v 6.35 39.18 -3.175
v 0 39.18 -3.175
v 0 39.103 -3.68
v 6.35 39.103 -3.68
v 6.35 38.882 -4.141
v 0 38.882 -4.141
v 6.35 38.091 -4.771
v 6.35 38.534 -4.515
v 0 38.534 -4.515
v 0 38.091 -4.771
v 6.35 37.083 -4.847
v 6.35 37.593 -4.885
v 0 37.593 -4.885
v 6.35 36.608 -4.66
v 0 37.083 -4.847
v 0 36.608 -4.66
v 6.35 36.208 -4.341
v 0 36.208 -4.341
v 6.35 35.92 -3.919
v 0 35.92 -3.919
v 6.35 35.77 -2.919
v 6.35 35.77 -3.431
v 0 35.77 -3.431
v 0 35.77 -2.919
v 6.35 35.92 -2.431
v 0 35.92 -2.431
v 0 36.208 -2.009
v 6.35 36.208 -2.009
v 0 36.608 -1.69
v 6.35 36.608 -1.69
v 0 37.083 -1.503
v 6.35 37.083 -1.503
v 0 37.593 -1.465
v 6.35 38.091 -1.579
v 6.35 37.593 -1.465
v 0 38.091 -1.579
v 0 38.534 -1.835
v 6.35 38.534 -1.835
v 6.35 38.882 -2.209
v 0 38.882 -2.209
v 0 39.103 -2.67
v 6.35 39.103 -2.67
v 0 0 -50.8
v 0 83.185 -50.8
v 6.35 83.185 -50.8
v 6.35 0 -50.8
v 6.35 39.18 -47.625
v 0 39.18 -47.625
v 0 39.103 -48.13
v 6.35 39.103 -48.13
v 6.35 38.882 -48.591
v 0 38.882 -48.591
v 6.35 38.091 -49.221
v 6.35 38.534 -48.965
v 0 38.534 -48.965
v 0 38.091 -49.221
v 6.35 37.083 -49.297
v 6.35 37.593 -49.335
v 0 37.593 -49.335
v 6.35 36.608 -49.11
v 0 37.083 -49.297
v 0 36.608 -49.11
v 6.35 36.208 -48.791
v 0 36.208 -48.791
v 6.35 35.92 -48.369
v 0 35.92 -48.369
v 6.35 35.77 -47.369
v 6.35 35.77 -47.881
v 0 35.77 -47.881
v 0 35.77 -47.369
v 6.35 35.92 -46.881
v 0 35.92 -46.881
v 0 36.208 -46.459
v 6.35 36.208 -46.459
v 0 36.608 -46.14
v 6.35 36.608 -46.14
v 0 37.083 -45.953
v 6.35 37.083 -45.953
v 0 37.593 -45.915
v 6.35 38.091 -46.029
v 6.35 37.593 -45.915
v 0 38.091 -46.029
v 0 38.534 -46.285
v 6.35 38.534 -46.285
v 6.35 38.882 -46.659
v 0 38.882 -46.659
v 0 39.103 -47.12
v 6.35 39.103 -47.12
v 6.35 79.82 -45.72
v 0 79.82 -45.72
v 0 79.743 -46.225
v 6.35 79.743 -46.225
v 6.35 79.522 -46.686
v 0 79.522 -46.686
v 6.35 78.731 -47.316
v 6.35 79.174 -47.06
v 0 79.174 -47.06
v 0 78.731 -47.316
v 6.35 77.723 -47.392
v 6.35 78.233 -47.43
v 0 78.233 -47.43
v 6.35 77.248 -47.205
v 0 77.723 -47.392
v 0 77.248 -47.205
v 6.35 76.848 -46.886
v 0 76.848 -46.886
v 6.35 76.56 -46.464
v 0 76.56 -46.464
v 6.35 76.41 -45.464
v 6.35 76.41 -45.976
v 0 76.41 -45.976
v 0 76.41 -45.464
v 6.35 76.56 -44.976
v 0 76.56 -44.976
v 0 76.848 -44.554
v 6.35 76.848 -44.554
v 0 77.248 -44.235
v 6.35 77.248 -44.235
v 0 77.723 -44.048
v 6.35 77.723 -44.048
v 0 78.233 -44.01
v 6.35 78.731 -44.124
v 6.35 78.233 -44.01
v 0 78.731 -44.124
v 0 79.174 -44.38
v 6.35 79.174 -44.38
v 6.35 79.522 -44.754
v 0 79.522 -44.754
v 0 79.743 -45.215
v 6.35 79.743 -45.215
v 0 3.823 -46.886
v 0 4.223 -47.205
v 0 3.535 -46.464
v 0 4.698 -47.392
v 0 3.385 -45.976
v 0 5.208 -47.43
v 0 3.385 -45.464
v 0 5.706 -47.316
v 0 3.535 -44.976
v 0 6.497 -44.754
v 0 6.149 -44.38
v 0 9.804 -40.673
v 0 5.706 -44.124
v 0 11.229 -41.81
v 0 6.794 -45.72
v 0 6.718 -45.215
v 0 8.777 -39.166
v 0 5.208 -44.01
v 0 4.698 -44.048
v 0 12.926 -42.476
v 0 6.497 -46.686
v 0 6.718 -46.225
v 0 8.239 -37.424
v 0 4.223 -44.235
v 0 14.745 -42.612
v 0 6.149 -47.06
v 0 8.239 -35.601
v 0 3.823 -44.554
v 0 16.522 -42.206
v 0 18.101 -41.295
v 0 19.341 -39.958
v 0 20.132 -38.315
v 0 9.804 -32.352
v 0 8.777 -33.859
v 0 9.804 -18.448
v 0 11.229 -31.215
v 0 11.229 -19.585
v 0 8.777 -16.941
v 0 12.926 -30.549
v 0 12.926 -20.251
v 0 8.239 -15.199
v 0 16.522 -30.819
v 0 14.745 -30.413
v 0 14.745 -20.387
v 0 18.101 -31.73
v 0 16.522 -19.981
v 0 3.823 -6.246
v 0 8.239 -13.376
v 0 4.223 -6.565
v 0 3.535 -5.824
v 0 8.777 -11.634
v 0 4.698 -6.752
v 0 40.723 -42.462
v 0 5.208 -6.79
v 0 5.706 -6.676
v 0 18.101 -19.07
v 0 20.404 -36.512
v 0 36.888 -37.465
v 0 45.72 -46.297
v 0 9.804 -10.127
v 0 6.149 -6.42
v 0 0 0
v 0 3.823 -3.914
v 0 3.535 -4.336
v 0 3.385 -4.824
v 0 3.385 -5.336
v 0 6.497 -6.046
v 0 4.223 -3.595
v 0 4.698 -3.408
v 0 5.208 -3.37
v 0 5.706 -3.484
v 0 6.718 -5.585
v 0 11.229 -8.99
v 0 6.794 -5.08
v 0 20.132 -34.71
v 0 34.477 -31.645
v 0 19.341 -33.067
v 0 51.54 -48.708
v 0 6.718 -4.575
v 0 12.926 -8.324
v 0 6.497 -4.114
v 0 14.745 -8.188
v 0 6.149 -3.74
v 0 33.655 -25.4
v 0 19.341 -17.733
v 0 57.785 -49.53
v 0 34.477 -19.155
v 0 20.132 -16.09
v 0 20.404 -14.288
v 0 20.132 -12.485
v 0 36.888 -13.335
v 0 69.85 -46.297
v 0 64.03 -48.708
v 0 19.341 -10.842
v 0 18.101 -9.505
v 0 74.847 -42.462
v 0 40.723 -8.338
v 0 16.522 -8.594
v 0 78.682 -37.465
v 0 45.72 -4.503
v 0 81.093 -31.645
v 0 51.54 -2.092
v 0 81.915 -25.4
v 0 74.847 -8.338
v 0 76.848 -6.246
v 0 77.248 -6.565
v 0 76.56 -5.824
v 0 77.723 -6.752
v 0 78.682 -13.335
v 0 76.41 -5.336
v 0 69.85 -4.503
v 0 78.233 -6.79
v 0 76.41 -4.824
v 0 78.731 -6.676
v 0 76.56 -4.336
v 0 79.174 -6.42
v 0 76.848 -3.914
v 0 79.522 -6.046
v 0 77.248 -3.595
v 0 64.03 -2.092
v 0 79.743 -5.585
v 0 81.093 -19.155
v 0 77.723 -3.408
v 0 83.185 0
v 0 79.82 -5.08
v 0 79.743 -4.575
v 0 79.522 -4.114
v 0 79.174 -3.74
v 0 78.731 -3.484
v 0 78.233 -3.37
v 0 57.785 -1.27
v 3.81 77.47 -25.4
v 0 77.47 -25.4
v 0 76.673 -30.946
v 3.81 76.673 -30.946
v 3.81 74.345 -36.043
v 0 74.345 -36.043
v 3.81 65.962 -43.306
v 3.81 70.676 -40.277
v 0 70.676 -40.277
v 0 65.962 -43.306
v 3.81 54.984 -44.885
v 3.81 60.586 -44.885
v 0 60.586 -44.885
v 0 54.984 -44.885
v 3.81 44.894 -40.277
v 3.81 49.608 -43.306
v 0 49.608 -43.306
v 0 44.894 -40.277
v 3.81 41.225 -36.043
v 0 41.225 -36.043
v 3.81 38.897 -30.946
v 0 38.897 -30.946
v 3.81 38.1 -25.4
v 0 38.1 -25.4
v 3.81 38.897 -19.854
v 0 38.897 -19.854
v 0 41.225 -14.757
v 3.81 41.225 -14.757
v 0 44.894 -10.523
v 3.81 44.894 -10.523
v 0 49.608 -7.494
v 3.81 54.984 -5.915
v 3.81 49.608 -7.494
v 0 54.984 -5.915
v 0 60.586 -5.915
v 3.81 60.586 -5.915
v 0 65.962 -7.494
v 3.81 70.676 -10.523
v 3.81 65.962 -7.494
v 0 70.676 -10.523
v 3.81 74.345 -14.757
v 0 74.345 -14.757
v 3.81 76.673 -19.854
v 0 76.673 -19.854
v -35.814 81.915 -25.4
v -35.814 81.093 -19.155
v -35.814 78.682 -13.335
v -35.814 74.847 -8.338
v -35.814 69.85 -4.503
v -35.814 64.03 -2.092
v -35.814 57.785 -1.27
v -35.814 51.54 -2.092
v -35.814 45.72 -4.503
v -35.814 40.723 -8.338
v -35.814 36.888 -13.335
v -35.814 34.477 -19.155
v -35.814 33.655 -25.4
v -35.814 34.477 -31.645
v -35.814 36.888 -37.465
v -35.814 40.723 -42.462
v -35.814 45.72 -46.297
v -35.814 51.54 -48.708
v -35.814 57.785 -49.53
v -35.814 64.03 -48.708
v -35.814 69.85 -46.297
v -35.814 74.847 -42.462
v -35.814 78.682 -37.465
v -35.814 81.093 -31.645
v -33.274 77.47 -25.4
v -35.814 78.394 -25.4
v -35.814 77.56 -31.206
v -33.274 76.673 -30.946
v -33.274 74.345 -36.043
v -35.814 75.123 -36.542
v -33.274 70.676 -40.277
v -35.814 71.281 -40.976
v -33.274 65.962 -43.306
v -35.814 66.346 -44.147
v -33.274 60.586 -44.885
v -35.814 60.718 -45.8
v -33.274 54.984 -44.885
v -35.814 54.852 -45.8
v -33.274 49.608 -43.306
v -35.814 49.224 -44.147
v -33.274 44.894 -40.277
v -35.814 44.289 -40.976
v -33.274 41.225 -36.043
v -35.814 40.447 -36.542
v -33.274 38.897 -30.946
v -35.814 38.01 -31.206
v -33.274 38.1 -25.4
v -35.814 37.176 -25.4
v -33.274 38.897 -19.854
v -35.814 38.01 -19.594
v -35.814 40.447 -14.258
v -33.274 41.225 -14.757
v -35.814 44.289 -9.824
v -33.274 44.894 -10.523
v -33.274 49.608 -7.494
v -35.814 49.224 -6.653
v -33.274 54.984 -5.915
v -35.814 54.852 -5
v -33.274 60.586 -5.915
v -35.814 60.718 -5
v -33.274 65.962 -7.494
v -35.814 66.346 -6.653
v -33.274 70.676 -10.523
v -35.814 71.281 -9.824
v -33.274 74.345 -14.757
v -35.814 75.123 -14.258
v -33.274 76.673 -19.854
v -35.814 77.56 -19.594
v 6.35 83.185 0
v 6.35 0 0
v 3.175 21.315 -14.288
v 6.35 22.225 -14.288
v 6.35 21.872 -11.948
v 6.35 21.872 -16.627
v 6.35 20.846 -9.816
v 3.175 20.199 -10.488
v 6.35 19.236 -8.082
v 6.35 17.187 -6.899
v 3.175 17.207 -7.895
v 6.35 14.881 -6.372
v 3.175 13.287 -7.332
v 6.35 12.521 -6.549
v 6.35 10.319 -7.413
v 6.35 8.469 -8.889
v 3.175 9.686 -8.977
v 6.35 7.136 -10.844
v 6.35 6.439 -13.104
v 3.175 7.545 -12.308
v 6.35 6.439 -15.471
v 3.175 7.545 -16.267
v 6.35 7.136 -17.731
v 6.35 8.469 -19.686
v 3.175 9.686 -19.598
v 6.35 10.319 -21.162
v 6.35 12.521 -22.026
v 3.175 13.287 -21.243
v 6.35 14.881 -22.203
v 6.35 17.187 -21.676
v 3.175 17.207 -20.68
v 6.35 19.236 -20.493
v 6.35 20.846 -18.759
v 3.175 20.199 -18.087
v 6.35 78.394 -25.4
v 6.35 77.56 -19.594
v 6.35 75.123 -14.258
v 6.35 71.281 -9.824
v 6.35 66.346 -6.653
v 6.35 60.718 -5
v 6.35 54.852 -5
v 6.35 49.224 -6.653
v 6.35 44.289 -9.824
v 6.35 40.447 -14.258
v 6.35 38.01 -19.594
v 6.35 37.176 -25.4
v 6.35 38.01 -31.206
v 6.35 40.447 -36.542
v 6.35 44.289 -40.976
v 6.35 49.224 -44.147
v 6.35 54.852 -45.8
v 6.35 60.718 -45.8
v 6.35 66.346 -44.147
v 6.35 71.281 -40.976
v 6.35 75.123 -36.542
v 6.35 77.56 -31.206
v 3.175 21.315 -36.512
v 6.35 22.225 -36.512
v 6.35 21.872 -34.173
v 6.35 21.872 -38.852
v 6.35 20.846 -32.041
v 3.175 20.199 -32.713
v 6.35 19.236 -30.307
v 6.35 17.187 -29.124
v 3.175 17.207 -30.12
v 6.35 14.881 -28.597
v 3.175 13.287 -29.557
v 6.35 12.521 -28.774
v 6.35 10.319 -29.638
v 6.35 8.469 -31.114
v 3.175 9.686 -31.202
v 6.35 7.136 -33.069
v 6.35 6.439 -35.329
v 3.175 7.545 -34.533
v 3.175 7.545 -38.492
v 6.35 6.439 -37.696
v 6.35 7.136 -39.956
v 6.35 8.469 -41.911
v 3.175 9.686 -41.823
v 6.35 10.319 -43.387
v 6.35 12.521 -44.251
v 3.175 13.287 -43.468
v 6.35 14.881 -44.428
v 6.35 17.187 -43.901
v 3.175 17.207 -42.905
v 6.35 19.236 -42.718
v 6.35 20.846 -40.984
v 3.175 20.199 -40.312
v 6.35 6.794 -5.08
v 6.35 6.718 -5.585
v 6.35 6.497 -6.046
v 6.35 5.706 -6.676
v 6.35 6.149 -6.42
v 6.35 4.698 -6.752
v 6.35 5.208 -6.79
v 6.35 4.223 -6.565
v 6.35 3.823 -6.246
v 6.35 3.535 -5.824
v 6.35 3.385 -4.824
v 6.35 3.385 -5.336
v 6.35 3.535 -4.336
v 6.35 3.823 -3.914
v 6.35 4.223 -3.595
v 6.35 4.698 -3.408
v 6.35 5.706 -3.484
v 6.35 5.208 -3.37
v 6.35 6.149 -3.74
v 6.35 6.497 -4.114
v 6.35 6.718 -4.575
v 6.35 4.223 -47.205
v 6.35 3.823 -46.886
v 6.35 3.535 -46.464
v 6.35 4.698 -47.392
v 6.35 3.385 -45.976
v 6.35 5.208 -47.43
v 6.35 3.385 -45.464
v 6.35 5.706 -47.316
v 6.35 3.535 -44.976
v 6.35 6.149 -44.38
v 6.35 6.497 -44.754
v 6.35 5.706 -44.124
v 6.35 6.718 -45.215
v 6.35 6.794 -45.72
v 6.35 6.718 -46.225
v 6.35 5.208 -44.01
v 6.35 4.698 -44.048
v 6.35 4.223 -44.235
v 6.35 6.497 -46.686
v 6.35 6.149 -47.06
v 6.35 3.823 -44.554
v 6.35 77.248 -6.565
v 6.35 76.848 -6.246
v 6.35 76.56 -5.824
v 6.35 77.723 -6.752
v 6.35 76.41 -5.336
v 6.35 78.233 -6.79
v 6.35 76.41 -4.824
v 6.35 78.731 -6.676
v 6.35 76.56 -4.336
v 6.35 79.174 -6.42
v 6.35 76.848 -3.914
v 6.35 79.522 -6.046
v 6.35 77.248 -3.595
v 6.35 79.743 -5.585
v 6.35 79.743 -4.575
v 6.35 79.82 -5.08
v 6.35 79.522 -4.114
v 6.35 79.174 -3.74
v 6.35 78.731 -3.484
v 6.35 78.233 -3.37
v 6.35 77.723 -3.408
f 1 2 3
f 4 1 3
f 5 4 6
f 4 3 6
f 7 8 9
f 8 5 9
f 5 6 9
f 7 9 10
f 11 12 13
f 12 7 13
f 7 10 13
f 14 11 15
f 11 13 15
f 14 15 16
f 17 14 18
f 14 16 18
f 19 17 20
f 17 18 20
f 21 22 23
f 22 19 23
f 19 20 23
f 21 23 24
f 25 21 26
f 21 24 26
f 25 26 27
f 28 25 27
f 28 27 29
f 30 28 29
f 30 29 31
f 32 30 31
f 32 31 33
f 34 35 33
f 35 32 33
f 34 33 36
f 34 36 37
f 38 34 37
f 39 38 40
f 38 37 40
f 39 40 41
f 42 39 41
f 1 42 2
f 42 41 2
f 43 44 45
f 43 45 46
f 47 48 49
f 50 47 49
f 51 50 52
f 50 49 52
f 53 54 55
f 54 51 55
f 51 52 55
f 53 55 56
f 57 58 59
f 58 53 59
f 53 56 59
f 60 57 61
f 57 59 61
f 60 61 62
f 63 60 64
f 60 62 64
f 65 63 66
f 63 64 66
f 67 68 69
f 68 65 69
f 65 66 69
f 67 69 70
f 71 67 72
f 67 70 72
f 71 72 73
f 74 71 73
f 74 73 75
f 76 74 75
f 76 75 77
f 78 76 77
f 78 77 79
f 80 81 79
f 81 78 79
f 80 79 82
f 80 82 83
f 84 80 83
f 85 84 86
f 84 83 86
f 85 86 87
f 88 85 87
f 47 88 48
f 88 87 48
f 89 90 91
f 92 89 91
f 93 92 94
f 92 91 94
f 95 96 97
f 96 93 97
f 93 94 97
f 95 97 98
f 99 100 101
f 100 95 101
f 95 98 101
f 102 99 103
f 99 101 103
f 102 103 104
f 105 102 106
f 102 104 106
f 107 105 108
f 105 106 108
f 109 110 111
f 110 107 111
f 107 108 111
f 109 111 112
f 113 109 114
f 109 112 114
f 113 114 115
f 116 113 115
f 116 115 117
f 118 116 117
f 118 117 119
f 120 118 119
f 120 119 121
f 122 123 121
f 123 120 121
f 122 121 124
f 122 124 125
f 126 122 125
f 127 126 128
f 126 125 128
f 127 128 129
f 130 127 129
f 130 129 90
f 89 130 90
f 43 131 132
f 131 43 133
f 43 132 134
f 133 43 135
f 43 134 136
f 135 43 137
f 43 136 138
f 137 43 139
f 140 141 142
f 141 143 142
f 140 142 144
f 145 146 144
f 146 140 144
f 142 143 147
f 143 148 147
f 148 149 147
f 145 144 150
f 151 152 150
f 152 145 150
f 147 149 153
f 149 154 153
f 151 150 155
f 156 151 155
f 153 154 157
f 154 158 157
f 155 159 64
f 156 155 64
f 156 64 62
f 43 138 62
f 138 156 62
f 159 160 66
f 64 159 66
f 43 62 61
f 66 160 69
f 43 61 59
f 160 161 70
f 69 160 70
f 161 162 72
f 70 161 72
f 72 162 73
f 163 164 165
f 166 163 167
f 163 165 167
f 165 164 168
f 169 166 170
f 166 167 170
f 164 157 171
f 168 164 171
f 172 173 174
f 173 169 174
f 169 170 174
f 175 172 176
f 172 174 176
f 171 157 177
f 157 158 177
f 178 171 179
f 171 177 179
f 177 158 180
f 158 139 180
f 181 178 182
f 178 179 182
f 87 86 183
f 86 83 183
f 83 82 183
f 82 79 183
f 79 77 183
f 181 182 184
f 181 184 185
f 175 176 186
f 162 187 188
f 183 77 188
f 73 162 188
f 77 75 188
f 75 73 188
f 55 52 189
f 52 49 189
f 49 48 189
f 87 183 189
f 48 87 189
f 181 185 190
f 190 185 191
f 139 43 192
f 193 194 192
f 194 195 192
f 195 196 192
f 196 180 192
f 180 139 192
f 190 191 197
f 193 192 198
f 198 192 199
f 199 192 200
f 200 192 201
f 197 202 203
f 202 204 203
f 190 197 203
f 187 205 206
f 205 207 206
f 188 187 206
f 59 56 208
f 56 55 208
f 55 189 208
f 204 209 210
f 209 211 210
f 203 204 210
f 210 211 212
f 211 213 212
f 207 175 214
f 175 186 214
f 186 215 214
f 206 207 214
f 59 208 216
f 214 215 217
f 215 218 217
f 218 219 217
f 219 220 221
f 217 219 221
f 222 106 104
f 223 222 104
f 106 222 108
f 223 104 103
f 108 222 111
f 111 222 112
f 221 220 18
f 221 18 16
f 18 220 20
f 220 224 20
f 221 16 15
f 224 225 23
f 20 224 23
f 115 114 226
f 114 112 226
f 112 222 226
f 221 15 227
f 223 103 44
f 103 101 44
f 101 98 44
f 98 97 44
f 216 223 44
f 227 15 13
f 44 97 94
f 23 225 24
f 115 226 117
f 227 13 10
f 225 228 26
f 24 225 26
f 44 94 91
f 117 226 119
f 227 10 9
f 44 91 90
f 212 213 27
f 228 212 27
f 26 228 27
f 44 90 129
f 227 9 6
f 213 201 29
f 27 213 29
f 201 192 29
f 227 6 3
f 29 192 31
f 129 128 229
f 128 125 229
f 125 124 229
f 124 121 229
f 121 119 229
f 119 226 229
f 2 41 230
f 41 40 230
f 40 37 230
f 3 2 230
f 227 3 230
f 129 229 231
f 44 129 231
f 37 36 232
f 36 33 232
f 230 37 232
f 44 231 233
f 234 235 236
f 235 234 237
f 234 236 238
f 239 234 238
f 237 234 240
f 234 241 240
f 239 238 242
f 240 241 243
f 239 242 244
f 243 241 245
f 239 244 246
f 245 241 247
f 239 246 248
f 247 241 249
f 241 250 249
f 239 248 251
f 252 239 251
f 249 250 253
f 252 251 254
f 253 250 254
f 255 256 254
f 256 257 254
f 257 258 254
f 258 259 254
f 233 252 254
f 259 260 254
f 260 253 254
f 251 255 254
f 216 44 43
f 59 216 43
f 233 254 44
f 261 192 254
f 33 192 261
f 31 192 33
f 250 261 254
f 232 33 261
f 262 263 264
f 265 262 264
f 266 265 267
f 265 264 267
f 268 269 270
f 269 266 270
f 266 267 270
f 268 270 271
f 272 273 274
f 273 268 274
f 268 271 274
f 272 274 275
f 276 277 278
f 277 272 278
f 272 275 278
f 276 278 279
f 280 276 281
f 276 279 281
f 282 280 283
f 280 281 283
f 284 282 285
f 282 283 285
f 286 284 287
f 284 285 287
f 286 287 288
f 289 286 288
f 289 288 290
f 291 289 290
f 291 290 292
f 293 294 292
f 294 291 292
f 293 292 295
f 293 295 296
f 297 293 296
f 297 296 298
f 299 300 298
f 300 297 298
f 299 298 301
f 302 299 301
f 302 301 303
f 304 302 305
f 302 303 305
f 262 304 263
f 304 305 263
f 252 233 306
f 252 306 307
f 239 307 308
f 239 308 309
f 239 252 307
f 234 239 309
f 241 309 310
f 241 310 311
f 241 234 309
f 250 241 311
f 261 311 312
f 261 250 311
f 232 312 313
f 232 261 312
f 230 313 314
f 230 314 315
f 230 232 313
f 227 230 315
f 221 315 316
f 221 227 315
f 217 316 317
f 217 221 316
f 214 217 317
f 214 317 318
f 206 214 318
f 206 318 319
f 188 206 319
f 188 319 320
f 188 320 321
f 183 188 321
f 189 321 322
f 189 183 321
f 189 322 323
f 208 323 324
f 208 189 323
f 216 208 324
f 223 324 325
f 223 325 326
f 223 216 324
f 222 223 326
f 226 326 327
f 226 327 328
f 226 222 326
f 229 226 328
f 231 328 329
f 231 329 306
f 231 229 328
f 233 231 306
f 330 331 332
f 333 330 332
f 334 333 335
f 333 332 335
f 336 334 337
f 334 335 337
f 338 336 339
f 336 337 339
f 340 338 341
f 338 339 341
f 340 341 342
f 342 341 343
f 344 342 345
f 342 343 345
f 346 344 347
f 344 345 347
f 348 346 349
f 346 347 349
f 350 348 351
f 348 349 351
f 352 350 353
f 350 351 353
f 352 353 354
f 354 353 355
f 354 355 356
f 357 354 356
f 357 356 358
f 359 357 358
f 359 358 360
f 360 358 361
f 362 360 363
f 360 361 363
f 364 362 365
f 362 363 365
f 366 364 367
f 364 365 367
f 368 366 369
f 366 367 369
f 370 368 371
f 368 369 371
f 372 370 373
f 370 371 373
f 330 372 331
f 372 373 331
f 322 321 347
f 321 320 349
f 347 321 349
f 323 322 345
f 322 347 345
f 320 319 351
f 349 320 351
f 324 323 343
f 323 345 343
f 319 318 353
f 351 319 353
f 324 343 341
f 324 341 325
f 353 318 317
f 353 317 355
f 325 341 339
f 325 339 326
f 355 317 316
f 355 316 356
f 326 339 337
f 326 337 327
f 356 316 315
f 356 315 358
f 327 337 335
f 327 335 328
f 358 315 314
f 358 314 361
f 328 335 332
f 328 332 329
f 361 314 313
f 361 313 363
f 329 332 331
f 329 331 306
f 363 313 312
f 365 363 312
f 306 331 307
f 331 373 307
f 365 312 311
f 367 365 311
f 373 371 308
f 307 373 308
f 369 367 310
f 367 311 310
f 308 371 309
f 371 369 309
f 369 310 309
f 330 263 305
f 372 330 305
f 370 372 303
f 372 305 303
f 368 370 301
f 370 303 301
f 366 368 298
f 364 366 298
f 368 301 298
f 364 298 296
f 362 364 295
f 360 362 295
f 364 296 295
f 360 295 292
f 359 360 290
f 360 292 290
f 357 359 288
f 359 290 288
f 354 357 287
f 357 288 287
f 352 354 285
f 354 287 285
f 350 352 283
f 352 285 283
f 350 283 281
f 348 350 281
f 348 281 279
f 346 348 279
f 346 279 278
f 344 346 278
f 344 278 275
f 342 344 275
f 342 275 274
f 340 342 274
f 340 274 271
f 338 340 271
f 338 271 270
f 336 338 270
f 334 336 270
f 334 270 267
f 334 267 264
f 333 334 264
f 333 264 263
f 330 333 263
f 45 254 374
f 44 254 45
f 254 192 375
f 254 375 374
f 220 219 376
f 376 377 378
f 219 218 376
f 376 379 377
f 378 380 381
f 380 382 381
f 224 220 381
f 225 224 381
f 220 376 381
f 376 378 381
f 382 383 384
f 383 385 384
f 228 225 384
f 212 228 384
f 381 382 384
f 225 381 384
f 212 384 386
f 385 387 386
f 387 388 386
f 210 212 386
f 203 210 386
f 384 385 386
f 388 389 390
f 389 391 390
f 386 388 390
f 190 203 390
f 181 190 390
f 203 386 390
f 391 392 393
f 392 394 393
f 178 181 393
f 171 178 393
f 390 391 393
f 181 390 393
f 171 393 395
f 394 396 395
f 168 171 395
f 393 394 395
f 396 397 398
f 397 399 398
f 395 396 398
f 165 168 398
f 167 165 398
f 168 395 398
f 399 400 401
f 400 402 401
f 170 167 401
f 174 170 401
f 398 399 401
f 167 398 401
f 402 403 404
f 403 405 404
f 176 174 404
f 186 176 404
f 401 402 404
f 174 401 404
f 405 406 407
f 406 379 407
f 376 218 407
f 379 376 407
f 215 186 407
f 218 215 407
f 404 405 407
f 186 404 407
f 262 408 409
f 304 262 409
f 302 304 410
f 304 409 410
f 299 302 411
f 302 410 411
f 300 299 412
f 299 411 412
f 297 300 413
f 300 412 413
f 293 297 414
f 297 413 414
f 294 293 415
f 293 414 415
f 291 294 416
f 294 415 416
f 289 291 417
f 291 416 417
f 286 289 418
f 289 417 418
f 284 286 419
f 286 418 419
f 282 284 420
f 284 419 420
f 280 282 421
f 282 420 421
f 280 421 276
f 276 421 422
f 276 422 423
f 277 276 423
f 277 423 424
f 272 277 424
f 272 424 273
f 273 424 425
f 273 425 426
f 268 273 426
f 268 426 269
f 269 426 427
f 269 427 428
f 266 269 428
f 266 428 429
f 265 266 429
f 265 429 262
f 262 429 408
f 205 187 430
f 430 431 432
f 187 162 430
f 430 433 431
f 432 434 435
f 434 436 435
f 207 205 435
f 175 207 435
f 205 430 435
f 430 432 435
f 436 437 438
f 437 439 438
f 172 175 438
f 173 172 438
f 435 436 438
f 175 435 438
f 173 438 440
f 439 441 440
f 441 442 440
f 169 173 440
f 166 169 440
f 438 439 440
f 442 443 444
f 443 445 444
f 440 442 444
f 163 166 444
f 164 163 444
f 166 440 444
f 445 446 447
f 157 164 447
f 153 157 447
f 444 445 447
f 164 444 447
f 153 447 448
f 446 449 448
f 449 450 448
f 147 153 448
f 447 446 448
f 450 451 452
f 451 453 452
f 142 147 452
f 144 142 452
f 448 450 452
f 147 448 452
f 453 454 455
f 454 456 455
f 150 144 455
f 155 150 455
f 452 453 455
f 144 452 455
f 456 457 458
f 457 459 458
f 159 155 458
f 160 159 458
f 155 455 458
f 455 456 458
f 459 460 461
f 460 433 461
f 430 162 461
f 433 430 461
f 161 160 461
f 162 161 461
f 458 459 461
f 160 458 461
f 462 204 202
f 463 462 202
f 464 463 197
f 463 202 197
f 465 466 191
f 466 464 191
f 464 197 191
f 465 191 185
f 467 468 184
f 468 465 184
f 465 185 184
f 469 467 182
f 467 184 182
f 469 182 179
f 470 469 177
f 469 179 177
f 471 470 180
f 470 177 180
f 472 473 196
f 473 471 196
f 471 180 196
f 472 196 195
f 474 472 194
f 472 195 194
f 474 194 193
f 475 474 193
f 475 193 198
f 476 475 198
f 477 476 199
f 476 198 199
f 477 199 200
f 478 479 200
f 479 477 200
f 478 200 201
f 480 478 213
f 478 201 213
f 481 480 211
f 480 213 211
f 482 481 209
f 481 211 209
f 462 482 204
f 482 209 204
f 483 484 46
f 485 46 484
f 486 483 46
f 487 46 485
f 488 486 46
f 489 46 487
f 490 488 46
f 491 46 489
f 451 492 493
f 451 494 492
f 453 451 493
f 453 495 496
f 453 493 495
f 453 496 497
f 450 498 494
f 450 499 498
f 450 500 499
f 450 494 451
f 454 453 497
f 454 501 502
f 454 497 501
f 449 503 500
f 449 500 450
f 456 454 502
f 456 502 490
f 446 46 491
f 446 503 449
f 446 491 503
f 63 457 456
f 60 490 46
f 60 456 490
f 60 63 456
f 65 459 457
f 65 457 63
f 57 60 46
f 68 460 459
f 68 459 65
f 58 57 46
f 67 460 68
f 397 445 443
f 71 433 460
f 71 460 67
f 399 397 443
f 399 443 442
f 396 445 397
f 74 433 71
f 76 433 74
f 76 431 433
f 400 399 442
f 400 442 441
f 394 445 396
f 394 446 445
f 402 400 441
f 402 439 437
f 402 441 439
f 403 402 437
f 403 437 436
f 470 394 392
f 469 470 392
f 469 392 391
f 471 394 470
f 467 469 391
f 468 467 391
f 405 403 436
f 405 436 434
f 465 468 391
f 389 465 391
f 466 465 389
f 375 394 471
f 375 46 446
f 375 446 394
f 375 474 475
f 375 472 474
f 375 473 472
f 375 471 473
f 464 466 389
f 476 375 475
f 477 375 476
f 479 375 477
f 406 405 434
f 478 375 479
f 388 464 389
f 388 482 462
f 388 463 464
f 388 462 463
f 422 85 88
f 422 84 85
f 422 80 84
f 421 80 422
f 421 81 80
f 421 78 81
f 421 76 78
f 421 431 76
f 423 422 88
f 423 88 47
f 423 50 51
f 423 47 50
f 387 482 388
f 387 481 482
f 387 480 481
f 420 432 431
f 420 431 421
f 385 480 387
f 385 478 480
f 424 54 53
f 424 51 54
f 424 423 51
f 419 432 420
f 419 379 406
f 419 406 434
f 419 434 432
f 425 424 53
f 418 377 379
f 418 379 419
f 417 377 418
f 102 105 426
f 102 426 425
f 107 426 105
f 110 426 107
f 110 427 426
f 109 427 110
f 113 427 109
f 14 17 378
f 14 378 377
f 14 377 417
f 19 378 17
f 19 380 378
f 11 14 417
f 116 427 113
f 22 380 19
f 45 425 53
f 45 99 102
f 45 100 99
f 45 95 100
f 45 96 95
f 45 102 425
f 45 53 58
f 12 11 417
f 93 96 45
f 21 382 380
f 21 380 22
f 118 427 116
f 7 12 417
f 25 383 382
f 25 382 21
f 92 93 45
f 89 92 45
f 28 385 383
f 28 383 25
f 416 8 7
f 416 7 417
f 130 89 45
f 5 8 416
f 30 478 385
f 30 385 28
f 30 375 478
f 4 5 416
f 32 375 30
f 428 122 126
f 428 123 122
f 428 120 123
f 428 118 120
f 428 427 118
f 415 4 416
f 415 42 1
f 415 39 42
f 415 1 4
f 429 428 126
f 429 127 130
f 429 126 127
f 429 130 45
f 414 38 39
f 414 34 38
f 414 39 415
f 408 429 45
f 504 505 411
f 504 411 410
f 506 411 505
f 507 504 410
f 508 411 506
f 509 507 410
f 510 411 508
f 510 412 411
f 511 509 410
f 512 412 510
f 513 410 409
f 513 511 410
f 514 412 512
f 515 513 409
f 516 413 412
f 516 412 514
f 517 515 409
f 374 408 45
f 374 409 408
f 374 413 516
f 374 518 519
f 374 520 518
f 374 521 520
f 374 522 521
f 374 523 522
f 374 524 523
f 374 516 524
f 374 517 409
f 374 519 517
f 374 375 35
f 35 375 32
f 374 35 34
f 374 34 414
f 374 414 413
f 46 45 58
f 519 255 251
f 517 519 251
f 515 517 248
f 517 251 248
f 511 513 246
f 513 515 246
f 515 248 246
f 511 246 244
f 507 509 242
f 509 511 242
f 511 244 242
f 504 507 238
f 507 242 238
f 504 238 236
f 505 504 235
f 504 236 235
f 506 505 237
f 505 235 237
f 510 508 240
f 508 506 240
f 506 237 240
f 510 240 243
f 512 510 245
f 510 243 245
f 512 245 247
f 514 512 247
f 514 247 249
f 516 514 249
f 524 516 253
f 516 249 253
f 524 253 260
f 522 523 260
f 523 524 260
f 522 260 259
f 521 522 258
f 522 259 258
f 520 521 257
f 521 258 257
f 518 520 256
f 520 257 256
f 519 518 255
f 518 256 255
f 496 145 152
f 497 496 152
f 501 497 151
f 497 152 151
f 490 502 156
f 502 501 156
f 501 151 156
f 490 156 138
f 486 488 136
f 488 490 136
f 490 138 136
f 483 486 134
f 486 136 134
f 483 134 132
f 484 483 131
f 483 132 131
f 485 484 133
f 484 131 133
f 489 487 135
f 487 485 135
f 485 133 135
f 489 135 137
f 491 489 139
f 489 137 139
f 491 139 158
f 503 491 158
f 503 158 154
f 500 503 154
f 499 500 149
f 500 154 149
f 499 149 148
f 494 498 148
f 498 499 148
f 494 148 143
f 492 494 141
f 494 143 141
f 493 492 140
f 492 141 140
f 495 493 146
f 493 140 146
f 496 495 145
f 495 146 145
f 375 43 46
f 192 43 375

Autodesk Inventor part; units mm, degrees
ref_plane "YZ Plane" through (0, 0, 0) normal (1, 0, 0) x (0, 1, 0)
ref_plane "XZ Plane" through (0, 0, 0) normal (0, 1, 0) x (-1, 0, 0)
ref_plane "XY Plane" through (0, 0, 0) normal (0, 0, 1) x (1, 0, 0)
sketch "Sketch1" plane through (0, 0, 0) normal (1, 0, 0) x (0, 1, 0)
  line L0 (0, 0) -> (83.185, 0)
  line L1 (83.185, 0) -> (83.185, -50.8)
  line L2 (83.185, -50.8) -> (0, -50.8)
  line L3 (0, -50.8) -> (0, 0)
  circle A0 centre (57.785, -25.4) radius 19.685
  circle A1 centre (14.2875, -14.2875) radius 7.9375
  circle A2 centre (14.2875, -36.5125) radius 7.9375
  circle A3 centre (5.08, -5.08) radius 1.7145
  circle A4 centre (5.08, -45.72) radius 1.7145
  circle A5 centre (78.105, -5.08) radius 1.7145
  circle A6 centre (78.105, -45.72) radius 1.7145
  line L4 (83.185, 0) -> (32.385, 0)
  circle A7 centre (37.465, -47.625) radius 1.7145
  circle A8 centre (37.465, -3.175) radius 1.7145
  circle A9 centre (57.785, -25.4) radius 24.13
  dimension "d0" = 83.185
  dimension "d1" = 50.8
  dimension "d2" = 39.37
  dimension "d3" = 25.4
  dimension "d4" = 25.4
  dimension "d5" = 15.875
  dimension "d6" = 15.875
  dimension "d7" = 14.2875
  dimension "d8" = 14.2875
  dimension "d9" = 14.2875
  dimension "d10" = 14.2875
  dimension "d16" = 3.429
  dimension "d17" = 5.08
  dimension "d18" = 5.08
  dimension "d19" = 50.8
  dimension "d20" = 3.429
  dimension "d21" = 3.175
  dimension "d23" = 48.26
  dimension "d32" = 5.08
  dimension "d33" = 5.08
  dimension "d34" = 3.175
  dimension "d35" = 5.08
  dimension "d36" = 5.08
  dimension "d37" = 5.08
  dimension "d38" = 5.08
extrude "Extrusion1" add sketch "Sketch1" along normal blind 6.35 contours L0 L1 L2 L3 | A9
draft "FaceDraft1" angle 16 pull direction (1, 0, 0) faces at (4.2333, 22.1993, -37.1512) (4.2333, 22.1993, -14.9262) fixed edges at (6.35, 6.35, -36.5125) (6.35, 6.35, -14.2875)
extrude "Extrusion2" add sketch "Sketch1" against normal blind 35.814 contours A9
chamfer "Chamfer1" distance 2.54 angle 20 1 edges at (6.35, 38.1, -25.4) measured on face at (-7.7047, 77.4062, -26.984)
chamfer "Chamfer2" distance 2.54 angle 20 1 edges at (-35.814, 38.1, -25.4) measured on face at (-9.398, 77.2151, -28.5577)
properties part number "Engine Head Bottom"
